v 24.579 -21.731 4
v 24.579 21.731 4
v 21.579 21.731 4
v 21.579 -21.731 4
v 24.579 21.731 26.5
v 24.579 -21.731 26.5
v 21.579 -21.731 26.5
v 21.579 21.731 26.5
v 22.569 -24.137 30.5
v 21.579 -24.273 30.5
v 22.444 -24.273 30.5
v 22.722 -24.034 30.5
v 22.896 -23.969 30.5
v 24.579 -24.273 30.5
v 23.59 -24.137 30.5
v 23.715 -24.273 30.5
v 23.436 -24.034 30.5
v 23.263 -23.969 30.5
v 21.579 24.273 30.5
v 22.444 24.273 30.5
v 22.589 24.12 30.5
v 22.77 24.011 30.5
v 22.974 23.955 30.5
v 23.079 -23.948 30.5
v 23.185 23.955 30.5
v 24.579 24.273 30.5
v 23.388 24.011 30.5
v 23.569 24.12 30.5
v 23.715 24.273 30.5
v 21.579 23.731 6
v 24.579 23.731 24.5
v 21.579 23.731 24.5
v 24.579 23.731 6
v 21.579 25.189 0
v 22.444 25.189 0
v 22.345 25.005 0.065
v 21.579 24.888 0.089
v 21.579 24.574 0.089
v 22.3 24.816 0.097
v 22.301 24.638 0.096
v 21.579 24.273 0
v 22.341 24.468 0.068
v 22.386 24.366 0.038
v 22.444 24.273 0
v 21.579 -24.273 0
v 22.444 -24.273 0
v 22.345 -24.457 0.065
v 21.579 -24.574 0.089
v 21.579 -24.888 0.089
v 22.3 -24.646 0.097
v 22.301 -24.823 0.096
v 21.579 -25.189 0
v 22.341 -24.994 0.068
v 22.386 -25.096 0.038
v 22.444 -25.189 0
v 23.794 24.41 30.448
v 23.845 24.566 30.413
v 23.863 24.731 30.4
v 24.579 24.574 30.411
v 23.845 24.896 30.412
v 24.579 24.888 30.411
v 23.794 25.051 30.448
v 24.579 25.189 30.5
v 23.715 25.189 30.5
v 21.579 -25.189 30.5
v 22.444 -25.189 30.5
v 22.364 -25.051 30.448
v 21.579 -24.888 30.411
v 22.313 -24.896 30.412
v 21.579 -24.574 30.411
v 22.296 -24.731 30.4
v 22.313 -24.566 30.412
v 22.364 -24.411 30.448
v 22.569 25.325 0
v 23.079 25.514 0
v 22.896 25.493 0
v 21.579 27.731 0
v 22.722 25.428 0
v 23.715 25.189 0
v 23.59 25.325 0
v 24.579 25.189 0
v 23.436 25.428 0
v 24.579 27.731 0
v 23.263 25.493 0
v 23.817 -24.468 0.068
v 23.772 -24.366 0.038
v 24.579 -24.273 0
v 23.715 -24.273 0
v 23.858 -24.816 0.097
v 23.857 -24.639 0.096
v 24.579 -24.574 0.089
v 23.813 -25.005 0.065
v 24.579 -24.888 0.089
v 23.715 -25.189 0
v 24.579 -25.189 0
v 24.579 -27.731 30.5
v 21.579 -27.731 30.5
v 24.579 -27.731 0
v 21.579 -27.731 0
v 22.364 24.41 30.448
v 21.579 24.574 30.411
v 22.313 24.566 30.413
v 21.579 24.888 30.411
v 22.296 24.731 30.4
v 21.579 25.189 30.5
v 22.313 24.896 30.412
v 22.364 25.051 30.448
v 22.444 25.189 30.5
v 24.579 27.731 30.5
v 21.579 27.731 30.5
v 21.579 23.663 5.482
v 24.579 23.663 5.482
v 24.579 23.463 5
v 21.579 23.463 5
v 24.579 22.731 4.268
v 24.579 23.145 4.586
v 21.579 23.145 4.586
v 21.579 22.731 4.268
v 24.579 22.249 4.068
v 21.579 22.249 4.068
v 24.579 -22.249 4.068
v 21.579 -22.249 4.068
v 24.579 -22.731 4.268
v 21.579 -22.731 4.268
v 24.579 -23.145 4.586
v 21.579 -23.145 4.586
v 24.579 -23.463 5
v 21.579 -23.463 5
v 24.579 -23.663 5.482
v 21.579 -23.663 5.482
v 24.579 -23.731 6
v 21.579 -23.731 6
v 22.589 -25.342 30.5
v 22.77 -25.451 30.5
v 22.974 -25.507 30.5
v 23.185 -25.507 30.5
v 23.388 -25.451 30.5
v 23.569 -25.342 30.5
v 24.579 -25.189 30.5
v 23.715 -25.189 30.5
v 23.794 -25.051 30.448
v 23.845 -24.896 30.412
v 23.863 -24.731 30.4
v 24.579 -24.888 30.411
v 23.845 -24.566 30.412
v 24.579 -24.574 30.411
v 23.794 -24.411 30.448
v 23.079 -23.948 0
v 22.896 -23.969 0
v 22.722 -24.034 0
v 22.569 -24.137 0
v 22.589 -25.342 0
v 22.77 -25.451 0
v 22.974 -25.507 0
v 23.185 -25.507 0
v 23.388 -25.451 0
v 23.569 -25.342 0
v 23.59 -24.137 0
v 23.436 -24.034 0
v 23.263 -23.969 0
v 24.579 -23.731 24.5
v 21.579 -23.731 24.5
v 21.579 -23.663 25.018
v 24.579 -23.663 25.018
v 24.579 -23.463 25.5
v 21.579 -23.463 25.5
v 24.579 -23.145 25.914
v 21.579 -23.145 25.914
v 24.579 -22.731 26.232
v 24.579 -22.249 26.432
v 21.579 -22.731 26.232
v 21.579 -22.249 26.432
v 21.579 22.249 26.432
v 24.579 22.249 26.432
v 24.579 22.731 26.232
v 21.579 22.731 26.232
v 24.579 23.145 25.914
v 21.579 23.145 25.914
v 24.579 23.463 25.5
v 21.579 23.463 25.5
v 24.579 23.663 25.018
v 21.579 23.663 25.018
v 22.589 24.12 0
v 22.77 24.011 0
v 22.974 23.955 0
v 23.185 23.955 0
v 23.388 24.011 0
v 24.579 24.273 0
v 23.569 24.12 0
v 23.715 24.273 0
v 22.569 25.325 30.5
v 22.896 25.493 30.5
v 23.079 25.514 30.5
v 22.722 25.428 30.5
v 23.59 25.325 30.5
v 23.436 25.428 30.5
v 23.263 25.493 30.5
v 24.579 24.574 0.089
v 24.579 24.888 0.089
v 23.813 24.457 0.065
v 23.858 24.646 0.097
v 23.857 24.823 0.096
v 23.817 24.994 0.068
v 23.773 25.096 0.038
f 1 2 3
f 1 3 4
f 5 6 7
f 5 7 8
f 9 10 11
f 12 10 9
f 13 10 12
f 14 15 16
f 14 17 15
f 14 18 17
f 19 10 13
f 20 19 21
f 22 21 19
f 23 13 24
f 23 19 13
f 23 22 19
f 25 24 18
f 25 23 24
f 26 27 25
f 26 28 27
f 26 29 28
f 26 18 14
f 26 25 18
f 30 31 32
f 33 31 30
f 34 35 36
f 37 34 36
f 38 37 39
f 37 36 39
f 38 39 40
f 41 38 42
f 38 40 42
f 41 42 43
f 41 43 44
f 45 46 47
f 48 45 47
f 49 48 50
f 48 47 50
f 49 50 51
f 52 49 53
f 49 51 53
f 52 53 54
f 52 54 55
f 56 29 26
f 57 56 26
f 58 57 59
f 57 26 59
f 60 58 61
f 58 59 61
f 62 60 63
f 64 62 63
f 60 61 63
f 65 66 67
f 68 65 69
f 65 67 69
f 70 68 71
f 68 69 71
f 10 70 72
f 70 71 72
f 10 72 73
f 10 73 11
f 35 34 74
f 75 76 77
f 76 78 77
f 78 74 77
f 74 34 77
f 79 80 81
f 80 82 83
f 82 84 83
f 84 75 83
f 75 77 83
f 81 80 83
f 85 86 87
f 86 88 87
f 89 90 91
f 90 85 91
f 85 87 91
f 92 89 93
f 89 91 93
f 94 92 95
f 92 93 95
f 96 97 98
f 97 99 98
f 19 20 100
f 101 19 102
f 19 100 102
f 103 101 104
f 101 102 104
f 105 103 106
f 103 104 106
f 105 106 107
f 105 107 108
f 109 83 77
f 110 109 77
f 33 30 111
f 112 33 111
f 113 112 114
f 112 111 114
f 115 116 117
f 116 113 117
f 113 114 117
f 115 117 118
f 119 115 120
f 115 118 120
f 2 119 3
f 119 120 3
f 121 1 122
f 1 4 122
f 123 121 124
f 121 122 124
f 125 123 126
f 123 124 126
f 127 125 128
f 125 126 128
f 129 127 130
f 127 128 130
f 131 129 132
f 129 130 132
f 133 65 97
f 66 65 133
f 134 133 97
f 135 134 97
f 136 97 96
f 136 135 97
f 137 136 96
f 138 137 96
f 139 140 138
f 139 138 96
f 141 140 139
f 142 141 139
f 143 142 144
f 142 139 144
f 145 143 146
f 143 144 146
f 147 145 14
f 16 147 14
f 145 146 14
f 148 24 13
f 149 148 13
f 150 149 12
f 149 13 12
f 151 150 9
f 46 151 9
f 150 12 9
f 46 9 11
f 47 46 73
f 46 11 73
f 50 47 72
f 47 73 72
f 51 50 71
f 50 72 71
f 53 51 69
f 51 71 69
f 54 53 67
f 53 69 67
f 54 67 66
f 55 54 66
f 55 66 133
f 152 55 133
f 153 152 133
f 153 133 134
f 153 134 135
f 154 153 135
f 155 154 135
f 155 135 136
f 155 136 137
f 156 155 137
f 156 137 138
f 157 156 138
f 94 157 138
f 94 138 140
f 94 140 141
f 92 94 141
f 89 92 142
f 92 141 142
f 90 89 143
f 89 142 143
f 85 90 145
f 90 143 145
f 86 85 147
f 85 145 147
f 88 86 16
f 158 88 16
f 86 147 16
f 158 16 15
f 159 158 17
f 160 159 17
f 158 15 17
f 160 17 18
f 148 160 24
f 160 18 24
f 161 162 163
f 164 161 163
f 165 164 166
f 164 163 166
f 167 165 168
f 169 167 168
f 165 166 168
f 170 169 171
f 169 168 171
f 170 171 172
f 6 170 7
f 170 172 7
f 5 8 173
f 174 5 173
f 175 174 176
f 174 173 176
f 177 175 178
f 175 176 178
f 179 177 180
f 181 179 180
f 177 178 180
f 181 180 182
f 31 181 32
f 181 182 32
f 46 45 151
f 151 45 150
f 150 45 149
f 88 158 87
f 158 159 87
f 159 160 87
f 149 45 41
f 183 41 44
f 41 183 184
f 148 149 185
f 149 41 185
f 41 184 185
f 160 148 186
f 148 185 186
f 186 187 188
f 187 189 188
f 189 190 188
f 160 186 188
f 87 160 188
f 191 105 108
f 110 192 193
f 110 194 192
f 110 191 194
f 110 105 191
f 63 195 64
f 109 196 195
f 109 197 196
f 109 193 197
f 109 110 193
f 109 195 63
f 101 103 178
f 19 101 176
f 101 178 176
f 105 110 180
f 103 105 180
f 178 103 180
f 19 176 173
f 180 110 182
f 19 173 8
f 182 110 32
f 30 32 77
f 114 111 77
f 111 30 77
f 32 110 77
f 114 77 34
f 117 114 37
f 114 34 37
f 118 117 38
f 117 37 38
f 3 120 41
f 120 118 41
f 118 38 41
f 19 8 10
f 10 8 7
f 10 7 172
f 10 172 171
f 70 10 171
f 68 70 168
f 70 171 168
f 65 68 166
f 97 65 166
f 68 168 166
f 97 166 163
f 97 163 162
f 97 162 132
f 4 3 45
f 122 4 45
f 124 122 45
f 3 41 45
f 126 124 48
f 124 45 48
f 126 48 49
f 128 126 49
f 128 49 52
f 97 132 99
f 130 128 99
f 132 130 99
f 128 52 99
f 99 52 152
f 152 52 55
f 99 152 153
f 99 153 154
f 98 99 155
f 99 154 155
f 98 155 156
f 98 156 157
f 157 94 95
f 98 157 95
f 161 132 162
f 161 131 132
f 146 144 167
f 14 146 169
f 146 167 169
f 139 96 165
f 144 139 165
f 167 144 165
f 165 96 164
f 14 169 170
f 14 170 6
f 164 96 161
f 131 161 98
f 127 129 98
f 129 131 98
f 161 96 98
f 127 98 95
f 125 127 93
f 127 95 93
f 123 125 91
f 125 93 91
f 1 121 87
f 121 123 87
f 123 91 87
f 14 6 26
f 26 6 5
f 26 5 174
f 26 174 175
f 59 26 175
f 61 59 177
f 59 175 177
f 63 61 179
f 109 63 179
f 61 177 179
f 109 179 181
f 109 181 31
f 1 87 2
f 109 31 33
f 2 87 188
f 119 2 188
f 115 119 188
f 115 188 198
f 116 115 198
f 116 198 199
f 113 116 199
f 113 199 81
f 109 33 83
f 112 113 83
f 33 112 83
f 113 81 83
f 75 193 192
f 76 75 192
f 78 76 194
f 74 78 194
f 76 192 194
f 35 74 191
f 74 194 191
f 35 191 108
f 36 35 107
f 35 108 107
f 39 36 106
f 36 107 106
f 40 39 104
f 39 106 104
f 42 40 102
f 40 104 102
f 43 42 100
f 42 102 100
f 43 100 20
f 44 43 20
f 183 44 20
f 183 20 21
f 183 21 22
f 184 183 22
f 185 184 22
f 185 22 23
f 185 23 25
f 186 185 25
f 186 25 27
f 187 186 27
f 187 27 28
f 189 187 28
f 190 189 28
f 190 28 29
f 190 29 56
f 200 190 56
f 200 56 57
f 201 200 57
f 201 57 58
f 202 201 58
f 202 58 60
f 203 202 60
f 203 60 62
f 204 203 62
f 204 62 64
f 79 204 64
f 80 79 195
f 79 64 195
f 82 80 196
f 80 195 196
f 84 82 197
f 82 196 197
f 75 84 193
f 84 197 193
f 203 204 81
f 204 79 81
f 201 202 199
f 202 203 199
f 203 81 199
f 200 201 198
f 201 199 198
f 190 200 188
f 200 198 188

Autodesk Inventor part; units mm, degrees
ref_plane "YZ Plane" through (0, 0, 0) normal (1, 0, 0) x (0, 1, 0)
ref_plane "XZ Plane" through (0, 0, 0) normal (0, 1, 0) x (-1, 0, 0)
sketch "スケッチ1" plane through (0, 0, 0) normal (0, 0, 1) x (1, 0, 0)
  circle A0 centre (23.0793, 24.731) radius 1.1 projected
  circle A1 centre (23.0793, -24.731) radius 1.1 projected
  line L0 (24.5793, 27.731) -> (21.5793, 27.731)
  line L1 (21.5793, 27.731) -> (21.5793, -27.731)
  line L2 (21.5793, -27.731) -> (24.5793, -27.731)
  line L3 (24.5793, -27.731) -> (24.5793, 27.731)
  point P0 (0, 0)
  point P1 (23.0793, 27.731)
  dimension "d0" = 3
  dimension "d1" = 3
  dimension "d2" = 3
ref_plane "作業平面1" through (-53.6786, -65.4442, 30.5) normal (0, 0, -1) x (0.7071068, 0.7071068, 0)
extrude "押し出し1" add sketch "スケッチ1" along normal up to surface (30.5 mm away) contours A0 | A1 | L3 L2 L1 L0
sketch "スケッチ2" plane through (0, 0, 0) normal (0, 0, -1) x (-1, 0, 0)
  circle A0 centre (-23.0793, 24.731) radius 1.1 projected
  circle A1 centre (-23.0793, -24.731) radius 1.1 projected
  point P0 (0, 0)
hole "穴1" at (23.0793, 24.731, 0) at (23.0793, -24.731, 0) direction (0, 0, 1) diameter 1.567 end through all thread size "M2x0.4" class "6H" standard "ISO Metric profile"
sketch "スケッチ3" plane through (24.5793, -27.731, 0) normal (1, 0, 0) x (0, 0, -1)
  line L0 (-30.5, 0) -> (-30.5, 55.4619) projected
  line L1 (0, 0) -> (-30.5, 0) projected
  line L2 (0, 0) -> (0, 55.4619) projected
  line L3 (0, 55.4619) -> (-30.5, 55.4619) projected
  line L4 (-4, 51.4619) -> (-4, 4)
  line L5 (-4, 4) -> (-26.5, 4)
  line L6 (-26.5, 4) -> (-26.5, 51.4619)
  line L7 (-26.5, 51.4619) -> (-4, 51.4619)
  point P0 (0, 27.731)
  dimension "d12" = 4
extrude "押し出し2" cut sketch "スケッチ3" against normal through all contours L4 L5 L6 L7
fillet "フィレット1" radius 2 4 edges at (23.0793, 23.731, 26.5) (23.0793, 23.731, 4) (23.0793, -23.731, 26.5) (23.0793, -23.731, 4)
sketch "スケッチ4" plane through (24.5793, -27.731, 0) normal (1, 0, 0) x (0, 0, -1)
  line L0 (0, 53.2454) -> (0, 51.6784) construction
  line L1 (0, 3.7835) -> (0, 2.2165) construction
  line L2 (-30.5, 4.1) -> (-30.5, 1.9) construction
  line L3 (-30.5, 51.6784) -> (-30.5, 53.2454) construction
  circle A0 centre (-31.5, 52.4619) radius 1.1
  line L4 (0, 27.731) -> (-30.5, 27.731) construction
  line L5 (-30.5, 0) -> (-30.5, 55.4619) construction
  line L6 (-15.25, 27.731) -> (-15.25, 0) construction
  line L7 (0, 0) -> (-30.5, 0) construction
  circle A1 centre (-31.5, 3) radius 1.1
  circle A2 centre (1, 52.4619) radius 1.1
  circle A3 centre (1, 3) radius 1.1
  point P0 (-30.5, 52.4619)
  dimension "d16" = 2.2
  dimension "d17" = 1
extrude "押し出し3" cut sketch "スケッチ4" against normal through all
equation "\"d2\" = d1"
properties part number "kosinosita"
